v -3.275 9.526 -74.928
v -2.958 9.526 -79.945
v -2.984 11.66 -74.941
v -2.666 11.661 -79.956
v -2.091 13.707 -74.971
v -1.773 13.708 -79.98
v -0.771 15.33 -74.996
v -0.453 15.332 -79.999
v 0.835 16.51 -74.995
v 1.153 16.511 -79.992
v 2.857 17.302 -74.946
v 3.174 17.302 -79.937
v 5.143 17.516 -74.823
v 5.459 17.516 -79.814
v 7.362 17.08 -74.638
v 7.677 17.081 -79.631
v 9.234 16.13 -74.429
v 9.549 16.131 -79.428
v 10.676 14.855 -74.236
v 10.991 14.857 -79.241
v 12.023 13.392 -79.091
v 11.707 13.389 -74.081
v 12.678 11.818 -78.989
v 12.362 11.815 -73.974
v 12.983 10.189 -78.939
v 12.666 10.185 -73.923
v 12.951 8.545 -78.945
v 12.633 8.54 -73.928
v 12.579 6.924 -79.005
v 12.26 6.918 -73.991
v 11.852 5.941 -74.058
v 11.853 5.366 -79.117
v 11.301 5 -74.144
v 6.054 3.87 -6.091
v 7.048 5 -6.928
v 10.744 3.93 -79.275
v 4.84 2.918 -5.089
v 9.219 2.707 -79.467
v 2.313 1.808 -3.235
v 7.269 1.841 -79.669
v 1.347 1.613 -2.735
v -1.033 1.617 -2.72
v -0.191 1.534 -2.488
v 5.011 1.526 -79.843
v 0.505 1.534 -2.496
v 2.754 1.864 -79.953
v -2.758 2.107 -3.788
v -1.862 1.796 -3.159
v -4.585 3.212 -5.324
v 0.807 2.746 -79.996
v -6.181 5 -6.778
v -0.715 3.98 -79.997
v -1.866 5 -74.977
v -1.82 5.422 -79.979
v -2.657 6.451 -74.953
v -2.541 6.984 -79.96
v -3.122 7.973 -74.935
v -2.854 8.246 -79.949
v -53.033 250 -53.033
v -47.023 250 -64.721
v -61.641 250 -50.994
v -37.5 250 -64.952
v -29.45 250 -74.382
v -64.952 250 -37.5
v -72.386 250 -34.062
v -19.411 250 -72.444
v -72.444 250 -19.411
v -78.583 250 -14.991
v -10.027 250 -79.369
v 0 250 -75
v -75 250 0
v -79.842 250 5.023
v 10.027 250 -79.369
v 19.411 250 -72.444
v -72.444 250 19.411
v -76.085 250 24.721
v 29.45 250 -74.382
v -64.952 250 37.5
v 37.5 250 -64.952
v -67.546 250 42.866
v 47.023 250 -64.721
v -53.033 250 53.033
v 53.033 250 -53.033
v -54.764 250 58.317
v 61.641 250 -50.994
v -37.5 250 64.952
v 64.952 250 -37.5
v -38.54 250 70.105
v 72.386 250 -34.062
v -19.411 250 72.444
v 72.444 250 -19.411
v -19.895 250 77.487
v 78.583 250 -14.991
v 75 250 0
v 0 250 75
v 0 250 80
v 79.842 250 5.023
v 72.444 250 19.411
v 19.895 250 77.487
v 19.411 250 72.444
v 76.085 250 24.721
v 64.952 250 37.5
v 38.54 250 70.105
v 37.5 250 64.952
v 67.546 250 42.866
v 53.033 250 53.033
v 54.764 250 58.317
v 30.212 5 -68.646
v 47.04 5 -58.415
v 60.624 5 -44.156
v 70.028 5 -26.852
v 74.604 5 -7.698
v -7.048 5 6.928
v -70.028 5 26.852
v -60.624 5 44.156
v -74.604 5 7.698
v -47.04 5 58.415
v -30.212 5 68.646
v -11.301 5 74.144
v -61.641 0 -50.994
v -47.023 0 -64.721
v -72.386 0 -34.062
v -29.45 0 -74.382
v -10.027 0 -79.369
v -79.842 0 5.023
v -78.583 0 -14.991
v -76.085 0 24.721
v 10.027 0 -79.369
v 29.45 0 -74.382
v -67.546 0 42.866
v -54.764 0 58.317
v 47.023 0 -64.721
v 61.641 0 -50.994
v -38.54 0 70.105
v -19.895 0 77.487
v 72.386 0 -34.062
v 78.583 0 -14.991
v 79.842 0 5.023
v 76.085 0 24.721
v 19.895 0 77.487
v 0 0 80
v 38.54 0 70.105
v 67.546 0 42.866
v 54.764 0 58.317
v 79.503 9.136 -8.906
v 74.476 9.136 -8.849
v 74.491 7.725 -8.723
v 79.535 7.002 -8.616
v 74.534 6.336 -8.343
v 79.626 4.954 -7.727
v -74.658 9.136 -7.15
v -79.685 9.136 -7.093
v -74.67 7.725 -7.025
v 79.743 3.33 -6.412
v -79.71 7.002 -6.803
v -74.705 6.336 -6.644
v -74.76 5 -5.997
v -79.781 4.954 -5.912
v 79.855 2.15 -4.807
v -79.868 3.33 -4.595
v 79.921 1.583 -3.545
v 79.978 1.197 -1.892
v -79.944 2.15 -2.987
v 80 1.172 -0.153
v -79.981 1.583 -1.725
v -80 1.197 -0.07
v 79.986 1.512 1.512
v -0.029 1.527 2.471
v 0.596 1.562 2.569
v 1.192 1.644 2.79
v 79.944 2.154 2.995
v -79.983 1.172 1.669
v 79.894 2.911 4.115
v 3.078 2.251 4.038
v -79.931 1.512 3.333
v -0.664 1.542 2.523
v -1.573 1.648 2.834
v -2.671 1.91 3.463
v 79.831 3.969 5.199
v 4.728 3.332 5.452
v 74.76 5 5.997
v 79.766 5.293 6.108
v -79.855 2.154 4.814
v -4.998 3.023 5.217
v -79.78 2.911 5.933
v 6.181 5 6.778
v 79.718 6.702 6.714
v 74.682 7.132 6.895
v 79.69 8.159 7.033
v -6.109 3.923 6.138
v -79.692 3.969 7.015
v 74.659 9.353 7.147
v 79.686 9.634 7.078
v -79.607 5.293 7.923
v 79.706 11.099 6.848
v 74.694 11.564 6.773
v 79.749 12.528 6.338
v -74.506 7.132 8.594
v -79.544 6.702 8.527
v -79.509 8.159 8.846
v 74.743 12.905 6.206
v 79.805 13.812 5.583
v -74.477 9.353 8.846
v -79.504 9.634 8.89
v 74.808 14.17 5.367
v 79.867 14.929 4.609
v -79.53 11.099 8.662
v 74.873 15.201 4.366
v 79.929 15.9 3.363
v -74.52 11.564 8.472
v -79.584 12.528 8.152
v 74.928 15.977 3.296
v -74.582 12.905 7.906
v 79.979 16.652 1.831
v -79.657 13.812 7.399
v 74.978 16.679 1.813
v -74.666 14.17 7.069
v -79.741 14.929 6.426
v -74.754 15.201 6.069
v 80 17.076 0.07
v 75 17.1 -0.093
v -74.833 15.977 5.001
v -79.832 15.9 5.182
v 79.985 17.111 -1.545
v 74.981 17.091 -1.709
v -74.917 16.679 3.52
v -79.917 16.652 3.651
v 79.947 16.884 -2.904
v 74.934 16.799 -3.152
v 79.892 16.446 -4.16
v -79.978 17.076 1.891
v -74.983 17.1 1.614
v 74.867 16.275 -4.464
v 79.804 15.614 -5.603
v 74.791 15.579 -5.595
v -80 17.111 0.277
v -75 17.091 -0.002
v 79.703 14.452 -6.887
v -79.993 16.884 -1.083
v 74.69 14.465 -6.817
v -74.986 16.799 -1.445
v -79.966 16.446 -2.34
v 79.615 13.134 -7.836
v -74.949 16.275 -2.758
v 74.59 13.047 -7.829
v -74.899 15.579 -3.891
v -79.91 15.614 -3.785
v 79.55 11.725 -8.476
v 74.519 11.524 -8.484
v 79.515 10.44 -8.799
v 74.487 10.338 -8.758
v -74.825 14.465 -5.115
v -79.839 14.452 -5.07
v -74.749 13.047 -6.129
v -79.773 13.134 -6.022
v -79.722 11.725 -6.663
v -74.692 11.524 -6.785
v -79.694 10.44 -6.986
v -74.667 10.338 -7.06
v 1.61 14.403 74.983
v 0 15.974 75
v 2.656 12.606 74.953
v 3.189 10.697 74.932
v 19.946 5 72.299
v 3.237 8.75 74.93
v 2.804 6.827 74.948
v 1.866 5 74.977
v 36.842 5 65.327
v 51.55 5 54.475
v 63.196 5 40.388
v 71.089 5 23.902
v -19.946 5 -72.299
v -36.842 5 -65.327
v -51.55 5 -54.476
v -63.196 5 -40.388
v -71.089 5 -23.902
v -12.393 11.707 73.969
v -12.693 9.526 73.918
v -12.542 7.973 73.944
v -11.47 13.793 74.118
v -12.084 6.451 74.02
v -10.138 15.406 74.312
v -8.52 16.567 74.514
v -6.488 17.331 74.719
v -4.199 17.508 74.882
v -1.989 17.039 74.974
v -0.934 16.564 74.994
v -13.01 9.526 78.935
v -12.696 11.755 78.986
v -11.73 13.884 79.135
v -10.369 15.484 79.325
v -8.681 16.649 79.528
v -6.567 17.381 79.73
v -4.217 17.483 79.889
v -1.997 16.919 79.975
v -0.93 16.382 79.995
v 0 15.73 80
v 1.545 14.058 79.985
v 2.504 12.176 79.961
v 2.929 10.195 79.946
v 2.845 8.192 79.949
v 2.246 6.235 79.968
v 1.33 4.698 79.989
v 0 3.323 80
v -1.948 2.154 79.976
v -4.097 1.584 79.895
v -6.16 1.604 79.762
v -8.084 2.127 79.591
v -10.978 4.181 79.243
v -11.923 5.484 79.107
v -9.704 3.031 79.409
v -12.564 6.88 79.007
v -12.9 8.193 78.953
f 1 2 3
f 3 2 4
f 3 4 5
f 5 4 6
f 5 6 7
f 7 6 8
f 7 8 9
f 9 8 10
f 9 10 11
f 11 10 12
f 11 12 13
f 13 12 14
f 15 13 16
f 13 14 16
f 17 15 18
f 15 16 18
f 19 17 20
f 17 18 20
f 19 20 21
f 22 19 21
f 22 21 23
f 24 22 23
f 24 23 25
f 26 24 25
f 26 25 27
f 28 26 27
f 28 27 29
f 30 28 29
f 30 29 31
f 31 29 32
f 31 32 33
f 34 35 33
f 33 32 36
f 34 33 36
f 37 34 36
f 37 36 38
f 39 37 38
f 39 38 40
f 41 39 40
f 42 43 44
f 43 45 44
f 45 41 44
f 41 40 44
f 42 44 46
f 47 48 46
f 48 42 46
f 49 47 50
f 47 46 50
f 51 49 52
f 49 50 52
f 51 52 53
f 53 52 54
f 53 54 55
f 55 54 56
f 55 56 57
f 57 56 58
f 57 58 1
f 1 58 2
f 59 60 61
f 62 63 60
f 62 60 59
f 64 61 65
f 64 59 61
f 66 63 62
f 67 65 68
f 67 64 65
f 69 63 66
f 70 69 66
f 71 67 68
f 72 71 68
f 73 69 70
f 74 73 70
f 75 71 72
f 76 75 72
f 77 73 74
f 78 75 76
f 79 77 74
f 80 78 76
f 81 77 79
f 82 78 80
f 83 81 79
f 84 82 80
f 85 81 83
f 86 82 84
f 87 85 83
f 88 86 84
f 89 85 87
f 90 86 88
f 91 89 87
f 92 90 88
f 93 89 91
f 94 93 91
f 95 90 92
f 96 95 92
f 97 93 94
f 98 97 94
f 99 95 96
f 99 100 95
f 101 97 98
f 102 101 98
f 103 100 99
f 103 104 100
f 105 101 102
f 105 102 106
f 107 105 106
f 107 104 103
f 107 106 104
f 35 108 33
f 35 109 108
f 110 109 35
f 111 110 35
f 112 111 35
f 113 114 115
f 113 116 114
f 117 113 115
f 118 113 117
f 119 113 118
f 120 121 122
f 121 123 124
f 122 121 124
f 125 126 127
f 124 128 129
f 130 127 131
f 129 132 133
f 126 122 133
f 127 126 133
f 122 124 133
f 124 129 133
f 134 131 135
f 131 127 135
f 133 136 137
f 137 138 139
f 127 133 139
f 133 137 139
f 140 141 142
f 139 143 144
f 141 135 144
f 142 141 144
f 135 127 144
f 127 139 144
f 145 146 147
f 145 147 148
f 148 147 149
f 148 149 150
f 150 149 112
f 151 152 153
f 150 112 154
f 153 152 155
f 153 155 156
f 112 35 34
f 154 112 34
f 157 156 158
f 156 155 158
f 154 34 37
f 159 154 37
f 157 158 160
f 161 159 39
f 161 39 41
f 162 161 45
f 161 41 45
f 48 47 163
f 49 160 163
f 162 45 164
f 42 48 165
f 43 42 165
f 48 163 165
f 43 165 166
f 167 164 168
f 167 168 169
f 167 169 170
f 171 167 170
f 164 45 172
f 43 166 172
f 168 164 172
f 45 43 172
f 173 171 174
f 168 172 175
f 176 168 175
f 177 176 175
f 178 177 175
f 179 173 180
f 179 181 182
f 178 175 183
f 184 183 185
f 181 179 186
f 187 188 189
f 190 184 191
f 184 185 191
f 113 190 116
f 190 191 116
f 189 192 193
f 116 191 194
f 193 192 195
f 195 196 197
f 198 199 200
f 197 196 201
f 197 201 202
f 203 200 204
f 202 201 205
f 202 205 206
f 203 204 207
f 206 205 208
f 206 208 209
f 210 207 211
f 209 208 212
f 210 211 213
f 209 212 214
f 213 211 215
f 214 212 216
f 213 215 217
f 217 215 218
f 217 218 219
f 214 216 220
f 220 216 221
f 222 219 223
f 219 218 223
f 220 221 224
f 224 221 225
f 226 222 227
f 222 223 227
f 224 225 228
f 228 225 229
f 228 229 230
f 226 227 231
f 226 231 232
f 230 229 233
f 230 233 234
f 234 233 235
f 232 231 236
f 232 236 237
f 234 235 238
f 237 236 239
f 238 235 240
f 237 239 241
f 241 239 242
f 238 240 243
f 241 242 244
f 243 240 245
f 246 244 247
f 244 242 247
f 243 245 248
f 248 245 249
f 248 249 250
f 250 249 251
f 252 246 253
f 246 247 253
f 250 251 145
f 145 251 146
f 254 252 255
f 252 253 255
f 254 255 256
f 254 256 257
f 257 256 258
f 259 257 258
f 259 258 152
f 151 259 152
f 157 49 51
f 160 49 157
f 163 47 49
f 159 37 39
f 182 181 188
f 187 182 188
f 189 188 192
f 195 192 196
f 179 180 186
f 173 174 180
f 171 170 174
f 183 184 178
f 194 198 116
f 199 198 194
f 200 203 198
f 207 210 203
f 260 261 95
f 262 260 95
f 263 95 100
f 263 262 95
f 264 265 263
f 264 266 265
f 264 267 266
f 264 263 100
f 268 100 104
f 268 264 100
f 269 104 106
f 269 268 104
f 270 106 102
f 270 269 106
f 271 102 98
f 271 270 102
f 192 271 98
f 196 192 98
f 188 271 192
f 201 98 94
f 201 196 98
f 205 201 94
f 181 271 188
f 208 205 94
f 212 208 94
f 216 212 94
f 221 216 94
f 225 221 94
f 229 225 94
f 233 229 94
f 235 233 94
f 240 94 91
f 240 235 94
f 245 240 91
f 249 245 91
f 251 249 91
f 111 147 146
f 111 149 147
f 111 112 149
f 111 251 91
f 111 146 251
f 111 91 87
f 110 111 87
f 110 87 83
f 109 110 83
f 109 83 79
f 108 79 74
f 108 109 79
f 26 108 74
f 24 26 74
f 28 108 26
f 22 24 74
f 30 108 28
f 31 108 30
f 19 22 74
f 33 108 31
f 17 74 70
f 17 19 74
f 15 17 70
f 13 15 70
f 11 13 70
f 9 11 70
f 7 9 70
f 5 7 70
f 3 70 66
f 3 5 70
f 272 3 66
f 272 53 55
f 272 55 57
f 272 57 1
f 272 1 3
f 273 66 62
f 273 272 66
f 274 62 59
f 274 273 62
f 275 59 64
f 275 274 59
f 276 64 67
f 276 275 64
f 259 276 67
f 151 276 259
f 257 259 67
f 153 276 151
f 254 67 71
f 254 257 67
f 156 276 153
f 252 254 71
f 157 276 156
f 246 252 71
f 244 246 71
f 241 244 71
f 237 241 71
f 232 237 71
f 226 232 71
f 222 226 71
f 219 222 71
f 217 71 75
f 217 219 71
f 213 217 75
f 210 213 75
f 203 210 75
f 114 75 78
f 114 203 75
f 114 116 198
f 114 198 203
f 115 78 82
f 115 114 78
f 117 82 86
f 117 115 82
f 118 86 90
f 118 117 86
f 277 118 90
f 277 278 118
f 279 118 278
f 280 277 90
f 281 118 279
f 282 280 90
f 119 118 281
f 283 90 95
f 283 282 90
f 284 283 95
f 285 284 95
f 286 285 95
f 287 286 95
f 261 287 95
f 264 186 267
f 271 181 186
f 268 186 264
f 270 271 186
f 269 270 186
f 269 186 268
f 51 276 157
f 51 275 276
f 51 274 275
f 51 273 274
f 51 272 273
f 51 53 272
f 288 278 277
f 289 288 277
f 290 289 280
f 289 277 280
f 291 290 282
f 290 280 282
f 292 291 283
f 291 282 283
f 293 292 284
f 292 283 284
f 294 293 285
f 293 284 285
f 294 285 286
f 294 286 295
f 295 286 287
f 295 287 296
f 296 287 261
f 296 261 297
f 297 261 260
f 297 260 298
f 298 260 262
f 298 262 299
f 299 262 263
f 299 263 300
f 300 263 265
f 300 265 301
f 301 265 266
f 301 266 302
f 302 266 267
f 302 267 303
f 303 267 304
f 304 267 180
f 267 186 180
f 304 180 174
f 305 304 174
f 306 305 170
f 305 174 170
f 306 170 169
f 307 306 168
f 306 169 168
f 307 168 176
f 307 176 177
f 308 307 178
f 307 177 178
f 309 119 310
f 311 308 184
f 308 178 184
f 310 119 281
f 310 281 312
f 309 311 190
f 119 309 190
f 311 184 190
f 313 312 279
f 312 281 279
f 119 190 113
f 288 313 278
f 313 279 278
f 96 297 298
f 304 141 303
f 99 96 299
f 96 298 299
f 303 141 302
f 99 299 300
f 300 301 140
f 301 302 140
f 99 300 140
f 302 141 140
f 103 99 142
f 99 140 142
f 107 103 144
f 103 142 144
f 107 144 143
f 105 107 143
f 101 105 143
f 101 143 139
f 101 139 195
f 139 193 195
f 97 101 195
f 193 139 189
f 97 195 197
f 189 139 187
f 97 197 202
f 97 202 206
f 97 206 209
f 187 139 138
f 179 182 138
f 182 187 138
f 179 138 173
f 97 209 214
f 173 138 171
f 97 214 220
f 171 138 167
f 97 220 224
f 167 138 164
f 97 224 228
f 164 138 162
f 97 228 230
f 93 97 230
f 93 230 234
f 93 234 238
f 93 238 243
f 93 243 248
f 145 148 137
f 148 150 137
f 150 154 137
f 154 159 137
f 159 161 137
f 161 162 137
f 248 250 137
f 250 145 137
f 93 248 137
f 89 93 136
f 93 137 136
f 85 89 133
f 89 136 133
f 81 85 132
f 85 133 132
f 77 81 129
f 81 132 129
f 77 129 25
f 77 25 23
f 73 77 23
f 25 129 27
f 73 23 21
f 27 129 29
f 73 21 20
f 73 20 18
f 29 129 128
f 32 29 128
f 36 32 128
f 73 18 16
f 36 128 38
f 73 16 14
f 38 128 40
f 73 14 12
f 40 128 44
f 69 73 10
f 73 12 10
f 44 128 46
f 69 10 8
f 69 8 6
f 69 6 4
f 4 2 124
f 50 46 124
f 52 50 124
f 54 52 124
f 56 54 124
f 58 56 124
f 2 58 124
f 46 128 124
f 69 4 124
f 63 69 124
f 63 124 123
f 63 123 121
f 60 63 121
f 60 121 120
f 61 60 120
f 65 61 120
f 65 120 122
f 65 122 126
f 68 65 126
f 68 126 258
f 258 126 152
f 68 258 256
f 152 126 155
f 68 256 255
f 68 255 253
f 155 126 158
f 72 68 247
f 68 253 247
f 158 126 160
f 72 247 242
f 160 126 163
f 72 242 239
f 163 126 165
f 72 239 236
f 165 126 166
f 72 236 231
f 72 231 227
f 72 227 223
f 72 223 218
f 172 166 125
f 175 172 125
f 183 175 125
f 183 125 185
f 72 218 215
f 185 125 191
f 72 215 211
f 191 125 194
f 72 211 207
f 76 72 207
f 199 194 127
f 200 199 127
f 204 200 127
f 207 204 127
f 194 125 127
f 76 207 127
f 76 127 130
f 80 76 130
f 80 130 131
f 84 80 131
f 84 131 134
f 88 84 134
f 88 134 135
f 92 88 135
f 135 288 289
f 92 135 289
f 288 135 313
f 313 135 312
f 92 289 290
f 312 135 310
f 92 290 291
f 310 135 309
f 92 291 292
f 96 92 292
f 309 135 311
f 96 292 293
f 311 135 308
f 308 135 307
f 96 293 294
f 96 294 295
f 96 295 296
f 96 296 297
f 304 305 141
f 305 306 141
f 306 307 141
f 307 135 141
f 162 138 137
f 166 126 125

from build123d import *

# Parameters (mm, degrees)
SKETCH1_R                        = 80
BOSS_EXTRUDE1_DEPTH              = 250
SHELL3_T                         = -5
F_16_0MM_DOWEL_HOLE1_D           = 16
F_16_0MM_DOWEL_HOLE1_ON_FACE_2_D = 16


with BuildPart() as part:
    # Sketch1 → Boss-Extrude1 (new body)
    with BuildSketch(Plane(origin=(0, 0, 0), x_dir=(1, 0, 0), z_dir=(0, 1, 0))):
        with Locations(Location((0, 0, 0), (0, 0, 270))):
            Circle(SKETCH1_R)
    extrude(amount=BOSS_EXTRUDE1_DEPTH)

    # Shell3
    shell3_openings = [part.faces().sort_by_distance(p)[0] for p in [
        (0, 250, 0),
    ]]
    offset(amount=SHELL3_T, openings=shell3_openings, kind=Kind.INTERSECTION)

    # Ø16.0mm Dowel Hole1 (through all)
    with Locations(Plane(origin=(79.9948146, 9.136379981, -0.910844193), x_dir=(0.011385552407, 0, 0.999935182498), z_dir=(0.999935182498, 0, -0.011385552407))):
        with Locations((0, 0)):
            Hole(F_16_0MM_DOWEL_HOLE1_D / 2)

    # Ø16.0mm Dowel Hole1 on face 2 (through all)
    with Locations(Plane(origin=(-5.051729974, 9.526351975, 79.840340833), x_dir=(0.998004235716, 0, 0.063147014915), z_dir=(-0.063147014915, 0, 0.998004235716))):
        with Locations((0, 0)):
            Hole(F_16_0MM_DOWEL_HOLE1_ON_FACE_2_D / 2)


solid = part.part
